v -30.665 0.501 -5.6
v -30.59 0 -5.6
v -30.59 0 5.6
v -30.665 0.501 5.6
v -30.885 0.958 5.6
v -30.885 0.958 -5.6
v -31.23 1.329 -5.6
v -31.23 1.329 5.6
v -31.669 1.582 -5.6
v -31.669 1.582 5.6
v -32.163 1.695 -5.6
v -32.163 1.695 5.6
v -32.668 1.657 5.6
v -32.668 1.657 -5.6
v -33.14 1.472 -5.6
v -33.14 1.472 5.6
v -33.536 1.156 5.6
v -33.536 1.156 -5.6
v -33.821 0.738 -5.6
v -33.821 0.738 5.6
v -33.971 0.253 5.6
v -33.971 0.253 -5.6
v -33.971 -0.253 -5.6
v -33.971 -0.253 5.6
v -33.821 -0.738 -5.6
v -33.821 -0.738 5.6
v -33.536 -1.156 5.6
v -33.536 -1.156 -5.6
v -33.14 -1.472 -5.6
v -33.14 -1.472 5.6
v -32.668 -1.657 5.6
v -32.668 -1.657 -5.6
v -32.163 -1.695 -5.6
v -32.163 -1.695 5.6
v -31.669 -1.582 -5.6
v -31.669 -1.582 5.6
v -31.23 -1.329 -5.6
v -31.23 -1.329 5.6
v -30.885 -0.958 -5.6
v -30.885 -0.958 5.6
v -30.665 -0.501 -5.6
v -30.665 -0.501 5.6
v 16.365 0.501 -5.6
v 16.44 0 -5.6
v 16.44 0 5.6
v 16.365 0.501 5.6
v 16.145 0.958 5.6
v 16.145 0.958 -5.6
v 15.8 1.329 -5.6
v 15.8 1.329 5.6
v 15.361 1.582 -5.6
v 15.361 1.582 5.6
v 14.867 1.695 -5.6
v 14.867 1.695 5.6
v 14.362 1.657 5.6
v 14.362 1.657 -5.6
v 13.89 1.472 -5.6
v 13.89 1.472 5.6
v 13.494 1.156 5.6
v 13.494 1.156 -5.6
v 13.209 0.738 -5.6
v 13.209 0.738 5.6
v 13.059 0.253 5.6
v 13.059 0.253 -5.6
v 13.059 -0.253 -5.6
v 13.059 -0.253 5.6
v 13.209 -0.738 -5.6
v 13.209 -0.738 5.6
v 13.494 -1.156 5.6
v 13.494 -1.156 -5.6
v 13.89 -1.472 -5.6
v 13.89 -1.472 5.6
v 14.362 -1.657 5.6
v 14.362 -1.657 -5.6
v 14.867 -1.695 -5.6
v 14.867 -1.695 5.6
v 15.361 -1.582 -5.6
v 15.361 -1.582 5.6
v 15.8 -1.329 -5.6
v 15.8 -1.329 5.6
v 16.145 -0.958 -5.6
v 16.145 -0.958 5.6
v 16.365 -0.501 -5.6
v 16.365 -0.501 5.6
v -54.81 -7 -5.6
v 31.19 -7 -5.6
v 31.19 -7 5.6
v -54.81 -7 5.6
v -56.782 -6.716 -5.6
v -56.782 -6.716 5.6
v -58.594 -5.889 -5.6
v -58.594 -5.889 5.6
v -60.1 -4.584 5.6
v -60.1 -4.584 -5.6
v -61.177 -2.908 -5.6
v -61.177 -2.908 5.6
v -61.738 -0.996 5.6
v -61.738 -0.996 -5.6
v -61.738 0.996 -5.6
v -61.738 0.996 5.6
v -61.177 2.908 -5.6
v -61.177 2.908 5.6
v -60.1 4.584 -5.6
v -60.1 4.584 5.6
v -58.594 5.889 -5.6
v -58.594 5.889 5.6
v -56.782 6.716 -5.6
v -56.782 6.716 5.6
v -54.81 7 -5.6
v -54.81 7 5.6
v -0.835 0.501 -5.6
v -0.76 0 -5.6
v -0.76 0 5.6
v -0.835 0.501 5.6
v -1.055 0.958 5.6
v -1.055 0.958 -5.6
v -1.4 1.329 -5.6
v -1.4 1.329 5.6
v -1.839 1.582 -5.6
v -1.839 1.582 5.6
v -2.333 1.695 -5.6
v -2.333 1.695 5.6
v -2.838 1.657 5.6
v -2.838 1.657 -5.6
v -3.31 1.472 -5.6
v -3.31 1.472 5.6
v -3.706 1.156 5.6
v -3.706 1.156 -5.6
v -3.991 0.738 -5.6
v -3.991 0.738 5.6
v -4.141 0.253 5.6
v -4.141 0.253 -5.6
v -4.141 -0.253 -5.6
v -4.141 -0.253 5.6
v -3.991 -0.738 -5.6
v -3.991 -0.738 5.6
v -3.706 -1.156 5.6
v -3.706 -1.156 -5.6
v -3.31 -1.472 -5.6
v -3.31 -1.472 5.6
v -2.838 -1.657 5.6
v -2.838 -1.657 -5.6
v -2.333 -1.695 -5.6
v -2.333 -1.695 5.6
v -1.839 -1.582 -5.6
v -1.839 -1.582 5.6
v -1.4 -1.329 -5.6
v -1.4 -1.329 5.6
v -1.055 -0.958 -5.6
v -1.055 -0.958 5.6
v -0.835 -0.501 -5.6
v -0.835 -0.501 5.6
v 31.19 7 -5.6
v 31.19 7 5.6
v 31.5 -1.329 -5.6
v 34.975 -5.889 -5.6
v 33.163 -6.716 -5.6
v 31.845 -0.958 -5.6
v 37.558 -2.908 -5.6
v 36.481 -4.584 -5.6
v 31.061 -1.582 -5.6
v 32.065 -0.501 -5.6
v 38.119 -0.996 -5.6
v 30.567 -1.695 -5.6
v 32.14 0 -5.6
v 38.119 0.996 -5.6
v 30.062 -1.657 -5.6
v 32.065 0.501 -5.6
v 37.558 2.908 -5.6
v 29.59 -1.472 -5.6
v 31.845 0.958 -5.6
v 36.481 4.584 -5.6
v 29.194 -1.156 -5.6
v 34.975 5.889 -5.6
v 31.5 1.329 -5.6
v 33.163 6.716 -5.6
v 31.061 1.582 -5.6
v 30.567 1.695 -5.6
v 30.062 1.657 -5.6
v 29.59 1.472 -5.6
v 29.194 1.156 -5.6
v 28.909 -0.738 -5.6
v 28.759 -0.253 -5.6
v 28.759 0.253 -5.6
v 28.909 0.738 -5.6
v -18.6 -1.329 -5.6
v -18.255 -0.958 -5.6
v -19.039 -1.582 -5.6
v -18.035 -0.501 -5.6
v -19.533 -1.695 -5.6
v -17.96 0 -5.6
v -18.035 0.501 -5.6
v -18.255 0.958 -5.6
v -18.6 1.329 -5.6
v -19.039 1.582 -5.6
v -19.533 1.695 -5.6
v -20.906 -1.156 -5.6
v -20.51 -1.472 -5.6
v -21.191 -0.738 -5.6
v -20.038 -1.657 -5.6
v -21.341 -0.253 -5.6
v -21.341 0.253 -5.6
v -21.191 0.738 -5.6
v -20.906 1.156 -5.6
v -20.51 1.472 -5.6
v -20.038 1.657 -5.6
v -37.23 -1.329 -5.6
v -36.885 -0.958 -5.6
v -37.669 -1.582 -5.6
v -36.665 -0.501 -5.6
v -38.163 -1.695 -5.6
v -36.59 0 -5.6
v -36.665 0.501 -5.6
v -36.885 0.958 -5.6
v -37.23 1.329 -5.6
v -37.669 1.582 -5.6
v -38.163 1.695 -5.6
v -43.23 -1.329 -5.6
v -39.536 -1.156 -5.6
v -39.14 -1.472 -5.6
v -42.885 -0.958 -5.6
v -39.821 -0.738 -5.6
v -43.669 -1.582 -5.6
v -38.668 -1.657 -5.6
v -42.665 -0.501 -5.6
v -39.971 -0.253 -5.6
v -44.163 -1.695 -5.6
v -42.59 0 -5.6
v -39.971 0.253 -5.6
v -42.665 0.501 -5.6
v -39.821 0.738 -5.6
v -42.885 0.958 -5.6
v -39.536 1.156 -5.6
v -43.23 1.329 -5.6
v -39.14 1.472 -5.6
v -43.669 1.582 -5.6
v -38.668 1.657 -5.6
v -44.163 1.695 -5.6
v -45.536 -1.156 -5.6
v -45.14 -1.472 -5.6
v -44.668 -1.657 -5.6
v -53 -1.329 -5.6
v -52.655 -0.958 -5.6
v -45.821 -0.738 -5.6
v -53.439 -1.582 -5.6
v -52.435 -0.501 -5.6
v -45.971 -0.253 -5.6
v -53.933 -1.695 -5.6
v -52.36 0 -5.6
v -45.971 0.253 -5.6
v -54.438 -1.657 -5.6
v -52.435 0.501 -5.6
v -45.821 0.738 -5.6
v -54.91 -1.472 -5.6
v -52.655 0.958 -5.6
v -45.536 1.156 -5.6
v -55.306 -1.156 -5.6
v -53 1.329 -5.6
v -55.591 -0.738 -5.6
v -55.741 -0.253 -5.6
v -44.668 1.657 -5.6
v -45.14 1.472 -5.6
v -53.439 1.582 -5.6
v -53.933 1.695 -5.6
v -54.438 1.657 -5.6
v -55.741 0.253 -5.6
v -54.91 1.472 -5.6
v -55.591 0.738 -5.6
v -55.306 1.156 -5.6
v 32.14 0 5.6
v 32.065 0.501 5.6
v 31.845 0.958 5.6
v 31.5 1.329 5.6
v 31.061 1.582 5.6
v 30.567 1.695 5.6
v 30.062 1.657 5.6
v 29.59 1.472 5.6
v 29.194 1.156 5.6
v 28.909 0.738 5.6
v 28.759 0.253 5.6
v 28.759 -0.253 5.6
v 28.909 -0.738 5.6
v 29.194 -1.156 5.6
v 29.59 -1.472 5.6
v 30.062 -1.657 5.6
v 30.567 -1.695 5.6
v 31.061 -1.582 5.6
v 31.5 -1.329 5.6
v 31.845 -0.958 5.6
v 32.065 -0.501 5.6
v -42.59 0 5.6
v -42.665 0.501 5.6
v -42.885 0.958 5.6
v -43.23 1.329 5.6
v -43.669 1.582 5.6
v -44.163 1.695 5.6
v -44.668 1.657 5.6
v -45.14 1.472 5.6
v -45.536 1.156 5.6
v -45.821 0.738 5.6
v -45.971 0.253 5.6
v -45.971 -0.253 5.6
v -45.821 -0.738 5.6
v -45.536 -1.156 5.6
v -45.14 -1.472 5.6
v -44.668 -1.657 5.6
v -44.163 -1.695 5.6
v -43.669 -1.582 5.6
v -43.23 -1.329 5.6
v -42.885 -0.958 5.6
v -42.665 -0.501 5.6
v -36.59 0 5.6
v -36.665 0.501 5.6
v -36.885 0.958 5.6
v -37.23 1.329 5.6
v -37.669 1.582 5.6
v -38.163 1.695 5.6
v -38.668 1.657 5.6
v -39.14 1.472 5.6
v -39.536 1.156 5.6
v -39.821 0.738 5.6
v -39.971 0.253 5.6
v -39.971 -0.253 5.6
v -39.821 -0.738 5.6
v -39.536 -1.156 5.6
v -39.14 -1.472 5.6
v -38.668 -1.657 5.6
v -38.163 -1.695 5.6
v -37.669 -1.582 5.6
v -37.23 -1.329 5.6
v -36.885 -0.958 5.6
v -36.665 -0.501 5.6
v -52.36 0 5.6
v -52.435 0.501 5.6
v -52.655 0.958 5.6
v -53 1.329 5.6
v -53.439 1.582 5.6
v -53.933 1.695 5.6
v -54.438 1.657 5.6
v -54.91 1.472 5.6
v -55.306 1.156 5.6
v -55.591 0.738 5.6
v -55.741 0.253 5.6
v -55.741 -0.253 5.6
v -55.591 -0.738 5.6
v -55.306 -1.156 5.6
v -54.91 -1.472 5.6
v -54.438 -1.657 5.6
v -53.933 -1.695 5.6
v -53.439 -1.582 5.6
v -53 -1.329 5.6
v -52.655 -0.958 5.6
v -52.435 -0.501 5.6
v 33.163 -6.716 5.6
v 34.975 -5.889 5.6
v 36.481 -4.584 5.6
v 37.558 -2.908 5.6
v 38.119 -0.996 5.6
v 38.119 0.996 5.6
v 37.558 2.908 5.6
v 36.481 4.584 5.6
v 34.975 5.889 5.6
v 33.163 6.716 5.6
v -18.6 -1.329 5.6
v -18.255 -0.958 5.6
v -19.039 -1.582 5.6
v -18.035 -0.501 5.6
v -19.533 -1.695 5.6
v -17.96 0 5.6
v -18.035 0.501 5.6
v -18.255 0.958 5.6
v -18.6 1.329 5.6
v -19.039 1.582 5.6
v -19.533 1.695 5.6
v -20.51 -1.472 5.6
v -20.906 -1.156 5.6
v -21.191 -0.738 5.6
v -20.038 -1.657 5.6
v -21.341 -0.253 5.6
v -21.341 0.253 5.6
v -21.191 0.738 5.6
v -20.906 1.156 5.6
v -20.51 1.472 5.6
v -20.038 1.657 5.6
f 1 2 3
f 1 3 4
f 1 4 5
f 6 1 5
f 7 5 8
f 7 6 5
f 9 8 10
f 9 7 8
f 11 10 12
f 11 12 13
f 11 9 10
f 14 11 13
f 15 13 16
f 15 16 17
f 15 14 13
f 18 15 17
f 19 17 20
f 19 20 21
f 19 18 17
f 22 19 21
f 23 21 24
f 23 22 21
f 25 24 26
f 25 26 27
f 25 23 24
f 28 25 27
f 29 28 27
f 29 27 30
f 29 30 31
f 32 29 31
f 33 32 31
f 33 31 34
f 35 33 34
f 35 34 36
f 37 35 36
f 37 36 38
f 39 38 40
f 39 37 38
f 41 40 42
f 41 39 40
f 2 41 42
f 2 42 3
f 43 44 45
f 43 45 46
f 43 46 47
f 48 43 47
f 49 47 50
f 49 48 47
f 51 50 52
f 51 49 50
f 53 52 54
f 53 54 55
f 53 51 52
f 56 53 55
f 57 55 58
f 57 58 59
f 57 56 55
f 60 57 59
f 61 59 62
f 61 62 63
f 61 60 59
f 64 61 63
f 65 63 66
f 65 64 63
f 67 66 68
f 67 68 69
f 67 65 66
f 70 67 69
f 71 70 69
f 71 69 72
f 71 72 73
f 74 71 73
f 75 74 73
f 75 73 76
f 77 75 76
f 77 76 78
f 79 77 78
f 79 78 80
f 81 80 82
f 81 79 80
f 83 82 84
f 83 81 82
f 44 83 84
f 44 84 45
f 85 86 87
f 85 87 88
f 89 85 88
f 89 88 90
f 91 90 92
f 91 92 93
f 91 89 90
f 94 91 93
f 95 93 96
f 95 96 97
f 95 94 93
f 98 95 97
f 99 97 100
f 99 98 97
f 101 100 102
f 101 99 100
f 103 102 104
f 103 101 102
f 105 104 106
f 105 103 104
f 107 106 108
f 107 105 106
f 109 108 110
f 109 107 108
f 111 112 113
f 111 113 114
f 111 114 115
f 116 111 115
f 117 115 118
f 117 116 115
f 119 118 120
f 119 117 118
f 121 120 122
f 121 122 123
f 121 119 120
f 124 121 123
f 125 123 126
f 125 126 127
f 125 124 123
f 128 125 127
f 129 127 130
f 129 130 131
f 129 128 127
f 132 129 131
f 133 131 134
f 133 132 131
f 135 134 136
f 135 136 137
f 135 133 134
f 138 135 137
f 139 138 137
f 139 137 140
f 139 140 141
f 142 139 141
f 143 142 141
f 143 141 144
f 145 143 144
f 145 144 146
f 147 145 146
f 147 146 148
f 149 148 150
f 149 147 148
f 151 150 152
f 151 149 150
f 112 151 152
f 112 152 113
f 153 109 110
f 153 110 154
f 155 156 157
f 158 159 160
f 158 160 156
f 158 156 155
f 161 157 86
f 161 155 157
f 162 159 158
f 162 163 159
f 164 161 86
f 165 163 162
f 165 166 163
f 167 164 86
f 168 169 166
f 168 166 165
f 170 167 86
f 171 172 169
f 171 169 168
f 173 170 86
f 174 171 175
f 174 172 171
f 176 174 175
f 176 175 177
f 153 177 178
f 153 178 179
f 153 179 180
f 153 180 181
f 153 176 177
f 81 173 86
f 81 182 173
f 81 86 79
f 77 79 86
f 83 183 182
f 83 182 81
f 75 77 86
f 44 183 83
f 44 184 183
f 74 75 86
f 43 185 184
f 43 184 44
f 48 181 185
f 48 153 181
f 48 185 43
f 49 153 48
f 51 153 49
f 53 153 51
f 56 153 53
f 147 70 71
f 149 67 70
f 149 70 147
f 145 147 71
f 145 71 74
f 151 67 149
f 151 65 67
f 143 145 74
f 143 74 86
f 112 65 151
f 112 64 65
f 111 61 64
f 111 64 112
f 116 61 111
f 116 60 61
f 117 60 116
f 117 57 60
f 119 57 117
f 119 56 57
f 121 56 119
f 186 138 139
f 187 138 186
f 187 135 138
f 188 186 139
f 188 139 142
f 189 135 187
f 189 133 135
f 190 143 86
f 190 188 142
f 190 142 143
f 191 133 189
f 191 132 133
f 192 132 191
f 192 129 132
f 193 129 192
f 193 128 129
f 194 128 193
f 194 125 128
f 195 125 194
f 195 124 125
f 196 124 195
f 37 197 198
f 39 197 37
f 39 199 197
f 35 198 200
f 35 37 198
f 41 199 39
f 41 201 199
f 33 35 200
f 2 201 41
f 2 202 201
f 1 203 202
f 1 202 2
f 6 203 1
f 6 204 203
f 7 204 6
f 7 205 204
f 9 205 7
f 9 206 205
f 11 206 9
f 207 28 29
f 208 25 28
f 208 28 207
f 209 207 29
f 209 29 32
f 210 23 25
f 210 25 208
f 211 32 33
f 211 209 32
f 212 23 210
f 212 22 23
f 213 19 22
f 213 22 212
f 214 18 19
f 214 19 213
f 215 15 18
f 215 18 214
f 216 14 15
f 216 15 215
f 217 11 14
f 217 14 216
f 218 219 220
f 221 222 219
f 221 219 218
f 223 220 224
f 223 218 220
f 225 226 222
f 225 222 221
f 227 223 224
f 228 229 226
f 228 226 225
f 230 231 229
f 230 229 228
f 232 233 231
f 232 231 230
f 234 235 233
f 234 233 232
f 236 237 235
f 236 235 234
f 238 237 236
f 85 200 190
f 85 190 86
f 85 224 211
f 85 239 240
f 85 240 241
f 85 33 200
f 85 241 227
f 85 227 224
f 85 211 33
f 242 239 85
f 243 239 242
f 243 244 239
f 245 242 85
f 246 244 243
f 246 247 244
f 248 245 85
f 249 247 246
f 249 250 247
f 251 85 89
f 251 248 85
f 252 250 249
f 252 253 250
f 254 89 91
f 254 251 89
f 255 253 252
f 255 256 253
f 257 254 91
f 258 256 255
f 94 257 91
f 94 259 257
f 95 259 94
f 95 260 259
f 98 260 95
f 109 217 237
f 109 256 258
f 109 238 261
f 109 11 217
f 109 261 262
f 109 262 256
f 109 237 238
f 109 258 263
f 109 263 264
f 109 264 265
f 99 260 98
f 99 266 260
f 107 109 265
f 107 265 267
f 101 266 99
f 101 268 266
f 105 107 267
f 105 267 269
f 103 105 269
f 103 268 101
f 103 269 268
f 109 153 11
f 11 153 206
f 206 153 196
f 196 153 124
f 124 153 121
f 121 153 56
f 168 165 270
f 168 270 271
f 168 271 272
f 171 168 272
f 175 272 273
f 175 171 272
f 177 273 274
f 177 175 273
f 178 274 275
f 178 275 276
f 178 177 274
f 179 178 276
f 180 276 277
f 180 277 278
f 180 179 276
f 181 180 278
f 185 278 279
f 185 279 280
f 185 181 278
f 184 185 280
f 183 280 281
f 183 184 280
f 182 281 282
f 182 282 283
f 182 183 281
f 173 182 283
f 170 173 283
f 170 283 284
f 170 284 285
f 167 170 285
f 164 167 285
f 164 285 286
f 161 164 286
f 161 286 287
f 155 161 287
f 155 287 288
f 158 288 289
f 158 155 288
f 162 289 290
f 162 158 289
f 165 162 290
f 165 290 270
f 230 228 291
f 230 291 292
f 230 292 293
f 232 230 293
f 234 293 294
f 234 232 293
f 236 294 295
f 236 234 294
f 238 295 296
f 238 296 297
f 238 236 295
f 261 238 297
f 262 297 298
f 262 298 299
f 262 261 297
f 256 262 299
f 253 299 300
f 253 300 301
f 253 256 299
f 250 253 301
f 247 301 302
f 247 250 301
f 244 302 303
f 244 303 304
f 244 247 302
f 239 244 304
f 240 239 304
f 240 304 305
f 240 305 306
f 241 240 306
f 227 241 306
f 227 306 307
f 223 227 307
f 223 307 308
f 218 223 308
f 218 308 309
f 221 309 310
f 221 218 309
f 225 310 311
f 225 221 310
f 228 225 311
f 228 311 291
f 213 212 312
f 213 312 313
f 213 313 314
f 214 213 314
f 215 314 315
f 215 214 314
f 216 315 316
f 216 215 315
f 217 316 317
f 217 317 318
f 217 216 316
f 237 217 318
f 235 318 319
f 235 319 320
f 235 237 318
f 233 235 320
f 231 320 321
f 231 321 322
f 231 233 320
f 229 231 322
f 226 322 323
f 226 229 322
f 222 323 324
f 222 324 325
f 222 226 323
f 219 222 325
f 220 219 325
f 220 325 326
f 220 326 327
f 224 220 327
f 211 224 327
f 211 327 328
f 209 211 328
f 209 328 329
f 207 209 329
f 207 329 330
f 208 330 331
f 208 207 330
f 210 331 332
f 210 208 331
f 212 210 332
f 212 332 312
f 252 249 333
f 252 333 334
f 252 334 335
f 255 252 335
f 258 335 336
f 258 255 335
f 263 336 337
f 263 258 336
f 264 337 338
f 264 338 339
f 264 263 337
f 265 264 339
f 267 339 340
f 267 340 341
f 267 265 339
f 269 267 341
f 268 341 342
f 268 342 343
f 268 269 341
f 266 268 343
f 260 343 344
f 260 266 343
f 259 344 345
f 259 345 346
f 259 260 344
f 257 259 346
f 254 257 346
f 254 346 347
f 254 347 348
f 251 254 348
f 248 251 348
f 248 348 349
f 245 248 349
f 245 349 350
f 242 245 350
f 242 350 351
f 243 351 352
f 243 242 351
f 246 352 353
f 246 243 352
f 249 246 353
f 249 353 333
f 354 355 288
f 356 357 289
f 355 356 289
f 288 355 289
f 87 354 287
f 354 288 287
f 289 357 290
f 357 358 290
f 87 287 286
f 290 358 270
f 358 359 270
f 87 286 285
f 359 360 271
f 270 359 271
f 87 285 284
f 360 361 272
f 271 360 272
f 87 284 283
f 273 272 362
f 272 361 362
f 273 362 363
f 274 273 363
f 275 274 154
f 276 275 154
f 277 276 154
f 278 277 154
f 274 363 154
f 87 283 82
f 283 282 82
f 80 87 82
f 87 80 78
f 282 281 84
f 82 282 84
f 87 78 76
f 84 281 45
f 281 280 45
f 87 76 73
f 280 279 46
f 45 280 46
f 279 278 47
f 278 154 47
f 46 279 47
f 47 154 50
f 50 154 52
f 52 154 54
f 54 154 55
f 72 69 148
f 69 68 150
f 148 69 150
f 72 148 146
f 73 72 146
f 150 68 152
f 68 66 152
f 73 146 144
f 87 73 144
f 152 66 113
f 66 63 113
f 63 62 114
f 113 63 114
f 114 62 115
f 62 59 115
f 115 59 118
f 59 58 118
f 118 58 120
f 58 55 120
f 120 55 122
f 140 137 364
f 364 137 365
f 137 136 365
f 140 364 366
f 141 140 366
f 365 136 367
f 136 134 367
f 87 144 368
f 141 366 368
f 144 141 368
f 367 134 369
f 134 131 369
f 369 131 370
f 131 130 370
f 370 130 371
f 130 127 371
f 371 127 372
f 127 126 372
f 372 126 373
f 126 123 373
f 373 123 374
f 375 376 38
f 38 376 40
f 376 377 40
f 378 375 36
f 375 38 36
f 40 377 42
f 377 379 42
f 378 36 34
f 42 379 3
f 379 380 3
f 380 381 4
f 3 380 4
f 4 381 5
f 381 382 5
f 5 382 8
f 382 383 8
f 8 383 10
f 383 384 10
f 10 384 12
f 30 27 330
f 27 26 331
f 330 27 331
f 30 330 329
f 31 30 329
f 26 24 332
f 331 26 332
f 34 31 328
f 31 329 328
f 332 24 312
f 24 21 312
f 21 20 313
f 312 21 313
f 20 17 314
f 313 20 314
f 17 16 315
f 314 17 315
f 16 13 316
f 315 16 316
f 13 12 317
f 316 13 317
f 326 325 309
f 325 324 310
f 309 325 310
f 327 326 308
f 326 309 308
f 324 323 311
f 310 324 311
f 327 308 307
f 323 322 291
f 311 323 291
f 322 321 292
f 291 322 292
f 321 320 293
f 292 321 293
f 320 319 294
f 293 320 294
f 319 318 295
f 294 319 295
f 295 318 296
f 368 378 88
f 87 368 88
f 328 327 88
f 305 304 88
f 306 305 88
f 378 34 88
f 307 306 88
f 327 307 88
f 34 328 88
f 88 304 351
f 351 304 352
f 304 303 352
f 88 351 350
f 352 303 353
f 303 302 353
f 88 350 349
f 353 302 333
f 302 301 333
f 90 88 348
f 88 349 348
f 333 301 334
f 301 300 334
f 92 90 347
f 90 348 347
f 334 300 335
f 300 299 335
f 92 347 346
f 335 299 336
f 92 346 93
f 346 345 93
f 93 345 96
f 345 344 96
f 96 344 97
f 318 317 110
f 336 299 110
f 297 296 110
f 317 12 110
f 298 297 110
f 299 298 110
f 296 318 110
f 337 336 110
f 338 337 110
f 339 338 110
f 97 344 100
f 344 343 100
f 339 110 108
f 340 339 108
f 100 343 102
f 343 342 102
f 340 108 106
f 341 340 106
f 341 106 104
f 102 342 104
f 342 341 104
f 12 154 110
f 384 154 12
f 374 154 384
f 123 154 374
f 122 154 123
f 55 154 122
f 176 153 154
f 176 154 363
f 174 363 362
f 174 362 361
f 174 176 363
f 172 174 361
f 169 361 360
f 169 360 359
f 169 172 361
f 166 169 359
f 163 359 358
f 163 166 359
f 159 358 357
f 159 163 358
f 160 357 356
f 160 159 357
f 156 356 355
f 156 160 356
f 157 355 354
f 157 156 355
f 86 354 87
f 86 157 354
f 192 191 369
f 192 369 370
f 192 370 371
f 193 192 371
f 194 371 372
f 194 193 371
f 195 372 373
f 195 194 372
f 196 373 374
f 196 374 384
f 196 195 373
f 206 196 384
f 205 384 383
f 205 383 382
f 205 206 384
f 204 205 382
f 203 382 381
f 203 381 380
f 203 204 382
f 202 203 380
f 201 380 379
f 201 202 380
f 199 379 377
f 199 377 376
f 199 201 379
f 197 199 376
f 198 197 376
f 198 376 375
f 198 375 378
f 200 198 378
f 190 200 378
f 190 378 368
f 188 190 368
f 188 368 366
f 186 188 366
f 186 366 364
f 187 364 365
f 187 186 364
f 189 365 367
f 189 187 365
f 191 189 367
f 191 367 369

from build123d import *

# Parameters (mm, degrees)
BOSS_EXTRUDE1_DEPTH      = 2.8
BOSS_EXTRUDE1_DEPTH_BACK = 2.8
ECHELLE1_SCALE           = 2
SKETCH2_R                = 1.7
CUT_EXTRUDE6_DEPTH       = 11.2


with BuildPart() as part:
    # Sketch1 → Boss-Extrude1 (new, two sides: drawn at the far end of the back side and taken through both)
    with BuildSketch(Plane.XY.offset(-BOSS_EXTRUDE1_DEPTH_BACK)):
        with BuildLine():
            Line((-33.309608541, 3.5), (9.690391459, 3.5))
            ThreePointArc((9.690391459, 3.5), (13.190391459, 0), (9.690391459, -3.5))
            Line((9.690391459, -3.5), (-33.309608541, -3.5))
            ThreePointArc((-33.309608541, -3.5), (-36.809608541, 0), (-33.309608541, 3.5))
        make_face()
    extrude(amount=BOSS_EXTRUDE1_DEPTH + BOSS_EXTRUDE1_DEPTH_BACK)


with BuildPart() as part_1:
    # Echelle1: scaled about (-11.809608541, 0, 0)
    add(part.part.scale(ECHELLE1_SCALE).moved(Location((11.809608541, 0, 0))))

    # Sketch2 → Cut-Extrude6 (cut)
    with BuildSketch(Plane.XY.offset(-5.6)):
        with Locations((-38.289608541, 0)):
            Circle(SKETCH2_R)
        with Locations((-54.059608541, 0)):
            Circle(SKETCH2_R)
        with Locations((-19.659608541, 0)):
            Circle(SKETCH2_R)
        with Locations((-2.459608541, 0)):
            Circle(SKETCH2_R)
        with Locations((14.740391459, 0)):
            Circle(SKETCH2_R)
        with Locations((-44.289608541, 0)):
            Circle(SKETCH2_R)
        with Locations((-32.289608541, 0)):
            Circle(SKETCH2_R)
        with Locations((30.440391459, 0)):
            Circle(SKETCH2_R)
    extrude(amount=CUT_EXTRUDE6_DEPTH, mode=Mode.SUBTRACT)


solid = part_1.part
